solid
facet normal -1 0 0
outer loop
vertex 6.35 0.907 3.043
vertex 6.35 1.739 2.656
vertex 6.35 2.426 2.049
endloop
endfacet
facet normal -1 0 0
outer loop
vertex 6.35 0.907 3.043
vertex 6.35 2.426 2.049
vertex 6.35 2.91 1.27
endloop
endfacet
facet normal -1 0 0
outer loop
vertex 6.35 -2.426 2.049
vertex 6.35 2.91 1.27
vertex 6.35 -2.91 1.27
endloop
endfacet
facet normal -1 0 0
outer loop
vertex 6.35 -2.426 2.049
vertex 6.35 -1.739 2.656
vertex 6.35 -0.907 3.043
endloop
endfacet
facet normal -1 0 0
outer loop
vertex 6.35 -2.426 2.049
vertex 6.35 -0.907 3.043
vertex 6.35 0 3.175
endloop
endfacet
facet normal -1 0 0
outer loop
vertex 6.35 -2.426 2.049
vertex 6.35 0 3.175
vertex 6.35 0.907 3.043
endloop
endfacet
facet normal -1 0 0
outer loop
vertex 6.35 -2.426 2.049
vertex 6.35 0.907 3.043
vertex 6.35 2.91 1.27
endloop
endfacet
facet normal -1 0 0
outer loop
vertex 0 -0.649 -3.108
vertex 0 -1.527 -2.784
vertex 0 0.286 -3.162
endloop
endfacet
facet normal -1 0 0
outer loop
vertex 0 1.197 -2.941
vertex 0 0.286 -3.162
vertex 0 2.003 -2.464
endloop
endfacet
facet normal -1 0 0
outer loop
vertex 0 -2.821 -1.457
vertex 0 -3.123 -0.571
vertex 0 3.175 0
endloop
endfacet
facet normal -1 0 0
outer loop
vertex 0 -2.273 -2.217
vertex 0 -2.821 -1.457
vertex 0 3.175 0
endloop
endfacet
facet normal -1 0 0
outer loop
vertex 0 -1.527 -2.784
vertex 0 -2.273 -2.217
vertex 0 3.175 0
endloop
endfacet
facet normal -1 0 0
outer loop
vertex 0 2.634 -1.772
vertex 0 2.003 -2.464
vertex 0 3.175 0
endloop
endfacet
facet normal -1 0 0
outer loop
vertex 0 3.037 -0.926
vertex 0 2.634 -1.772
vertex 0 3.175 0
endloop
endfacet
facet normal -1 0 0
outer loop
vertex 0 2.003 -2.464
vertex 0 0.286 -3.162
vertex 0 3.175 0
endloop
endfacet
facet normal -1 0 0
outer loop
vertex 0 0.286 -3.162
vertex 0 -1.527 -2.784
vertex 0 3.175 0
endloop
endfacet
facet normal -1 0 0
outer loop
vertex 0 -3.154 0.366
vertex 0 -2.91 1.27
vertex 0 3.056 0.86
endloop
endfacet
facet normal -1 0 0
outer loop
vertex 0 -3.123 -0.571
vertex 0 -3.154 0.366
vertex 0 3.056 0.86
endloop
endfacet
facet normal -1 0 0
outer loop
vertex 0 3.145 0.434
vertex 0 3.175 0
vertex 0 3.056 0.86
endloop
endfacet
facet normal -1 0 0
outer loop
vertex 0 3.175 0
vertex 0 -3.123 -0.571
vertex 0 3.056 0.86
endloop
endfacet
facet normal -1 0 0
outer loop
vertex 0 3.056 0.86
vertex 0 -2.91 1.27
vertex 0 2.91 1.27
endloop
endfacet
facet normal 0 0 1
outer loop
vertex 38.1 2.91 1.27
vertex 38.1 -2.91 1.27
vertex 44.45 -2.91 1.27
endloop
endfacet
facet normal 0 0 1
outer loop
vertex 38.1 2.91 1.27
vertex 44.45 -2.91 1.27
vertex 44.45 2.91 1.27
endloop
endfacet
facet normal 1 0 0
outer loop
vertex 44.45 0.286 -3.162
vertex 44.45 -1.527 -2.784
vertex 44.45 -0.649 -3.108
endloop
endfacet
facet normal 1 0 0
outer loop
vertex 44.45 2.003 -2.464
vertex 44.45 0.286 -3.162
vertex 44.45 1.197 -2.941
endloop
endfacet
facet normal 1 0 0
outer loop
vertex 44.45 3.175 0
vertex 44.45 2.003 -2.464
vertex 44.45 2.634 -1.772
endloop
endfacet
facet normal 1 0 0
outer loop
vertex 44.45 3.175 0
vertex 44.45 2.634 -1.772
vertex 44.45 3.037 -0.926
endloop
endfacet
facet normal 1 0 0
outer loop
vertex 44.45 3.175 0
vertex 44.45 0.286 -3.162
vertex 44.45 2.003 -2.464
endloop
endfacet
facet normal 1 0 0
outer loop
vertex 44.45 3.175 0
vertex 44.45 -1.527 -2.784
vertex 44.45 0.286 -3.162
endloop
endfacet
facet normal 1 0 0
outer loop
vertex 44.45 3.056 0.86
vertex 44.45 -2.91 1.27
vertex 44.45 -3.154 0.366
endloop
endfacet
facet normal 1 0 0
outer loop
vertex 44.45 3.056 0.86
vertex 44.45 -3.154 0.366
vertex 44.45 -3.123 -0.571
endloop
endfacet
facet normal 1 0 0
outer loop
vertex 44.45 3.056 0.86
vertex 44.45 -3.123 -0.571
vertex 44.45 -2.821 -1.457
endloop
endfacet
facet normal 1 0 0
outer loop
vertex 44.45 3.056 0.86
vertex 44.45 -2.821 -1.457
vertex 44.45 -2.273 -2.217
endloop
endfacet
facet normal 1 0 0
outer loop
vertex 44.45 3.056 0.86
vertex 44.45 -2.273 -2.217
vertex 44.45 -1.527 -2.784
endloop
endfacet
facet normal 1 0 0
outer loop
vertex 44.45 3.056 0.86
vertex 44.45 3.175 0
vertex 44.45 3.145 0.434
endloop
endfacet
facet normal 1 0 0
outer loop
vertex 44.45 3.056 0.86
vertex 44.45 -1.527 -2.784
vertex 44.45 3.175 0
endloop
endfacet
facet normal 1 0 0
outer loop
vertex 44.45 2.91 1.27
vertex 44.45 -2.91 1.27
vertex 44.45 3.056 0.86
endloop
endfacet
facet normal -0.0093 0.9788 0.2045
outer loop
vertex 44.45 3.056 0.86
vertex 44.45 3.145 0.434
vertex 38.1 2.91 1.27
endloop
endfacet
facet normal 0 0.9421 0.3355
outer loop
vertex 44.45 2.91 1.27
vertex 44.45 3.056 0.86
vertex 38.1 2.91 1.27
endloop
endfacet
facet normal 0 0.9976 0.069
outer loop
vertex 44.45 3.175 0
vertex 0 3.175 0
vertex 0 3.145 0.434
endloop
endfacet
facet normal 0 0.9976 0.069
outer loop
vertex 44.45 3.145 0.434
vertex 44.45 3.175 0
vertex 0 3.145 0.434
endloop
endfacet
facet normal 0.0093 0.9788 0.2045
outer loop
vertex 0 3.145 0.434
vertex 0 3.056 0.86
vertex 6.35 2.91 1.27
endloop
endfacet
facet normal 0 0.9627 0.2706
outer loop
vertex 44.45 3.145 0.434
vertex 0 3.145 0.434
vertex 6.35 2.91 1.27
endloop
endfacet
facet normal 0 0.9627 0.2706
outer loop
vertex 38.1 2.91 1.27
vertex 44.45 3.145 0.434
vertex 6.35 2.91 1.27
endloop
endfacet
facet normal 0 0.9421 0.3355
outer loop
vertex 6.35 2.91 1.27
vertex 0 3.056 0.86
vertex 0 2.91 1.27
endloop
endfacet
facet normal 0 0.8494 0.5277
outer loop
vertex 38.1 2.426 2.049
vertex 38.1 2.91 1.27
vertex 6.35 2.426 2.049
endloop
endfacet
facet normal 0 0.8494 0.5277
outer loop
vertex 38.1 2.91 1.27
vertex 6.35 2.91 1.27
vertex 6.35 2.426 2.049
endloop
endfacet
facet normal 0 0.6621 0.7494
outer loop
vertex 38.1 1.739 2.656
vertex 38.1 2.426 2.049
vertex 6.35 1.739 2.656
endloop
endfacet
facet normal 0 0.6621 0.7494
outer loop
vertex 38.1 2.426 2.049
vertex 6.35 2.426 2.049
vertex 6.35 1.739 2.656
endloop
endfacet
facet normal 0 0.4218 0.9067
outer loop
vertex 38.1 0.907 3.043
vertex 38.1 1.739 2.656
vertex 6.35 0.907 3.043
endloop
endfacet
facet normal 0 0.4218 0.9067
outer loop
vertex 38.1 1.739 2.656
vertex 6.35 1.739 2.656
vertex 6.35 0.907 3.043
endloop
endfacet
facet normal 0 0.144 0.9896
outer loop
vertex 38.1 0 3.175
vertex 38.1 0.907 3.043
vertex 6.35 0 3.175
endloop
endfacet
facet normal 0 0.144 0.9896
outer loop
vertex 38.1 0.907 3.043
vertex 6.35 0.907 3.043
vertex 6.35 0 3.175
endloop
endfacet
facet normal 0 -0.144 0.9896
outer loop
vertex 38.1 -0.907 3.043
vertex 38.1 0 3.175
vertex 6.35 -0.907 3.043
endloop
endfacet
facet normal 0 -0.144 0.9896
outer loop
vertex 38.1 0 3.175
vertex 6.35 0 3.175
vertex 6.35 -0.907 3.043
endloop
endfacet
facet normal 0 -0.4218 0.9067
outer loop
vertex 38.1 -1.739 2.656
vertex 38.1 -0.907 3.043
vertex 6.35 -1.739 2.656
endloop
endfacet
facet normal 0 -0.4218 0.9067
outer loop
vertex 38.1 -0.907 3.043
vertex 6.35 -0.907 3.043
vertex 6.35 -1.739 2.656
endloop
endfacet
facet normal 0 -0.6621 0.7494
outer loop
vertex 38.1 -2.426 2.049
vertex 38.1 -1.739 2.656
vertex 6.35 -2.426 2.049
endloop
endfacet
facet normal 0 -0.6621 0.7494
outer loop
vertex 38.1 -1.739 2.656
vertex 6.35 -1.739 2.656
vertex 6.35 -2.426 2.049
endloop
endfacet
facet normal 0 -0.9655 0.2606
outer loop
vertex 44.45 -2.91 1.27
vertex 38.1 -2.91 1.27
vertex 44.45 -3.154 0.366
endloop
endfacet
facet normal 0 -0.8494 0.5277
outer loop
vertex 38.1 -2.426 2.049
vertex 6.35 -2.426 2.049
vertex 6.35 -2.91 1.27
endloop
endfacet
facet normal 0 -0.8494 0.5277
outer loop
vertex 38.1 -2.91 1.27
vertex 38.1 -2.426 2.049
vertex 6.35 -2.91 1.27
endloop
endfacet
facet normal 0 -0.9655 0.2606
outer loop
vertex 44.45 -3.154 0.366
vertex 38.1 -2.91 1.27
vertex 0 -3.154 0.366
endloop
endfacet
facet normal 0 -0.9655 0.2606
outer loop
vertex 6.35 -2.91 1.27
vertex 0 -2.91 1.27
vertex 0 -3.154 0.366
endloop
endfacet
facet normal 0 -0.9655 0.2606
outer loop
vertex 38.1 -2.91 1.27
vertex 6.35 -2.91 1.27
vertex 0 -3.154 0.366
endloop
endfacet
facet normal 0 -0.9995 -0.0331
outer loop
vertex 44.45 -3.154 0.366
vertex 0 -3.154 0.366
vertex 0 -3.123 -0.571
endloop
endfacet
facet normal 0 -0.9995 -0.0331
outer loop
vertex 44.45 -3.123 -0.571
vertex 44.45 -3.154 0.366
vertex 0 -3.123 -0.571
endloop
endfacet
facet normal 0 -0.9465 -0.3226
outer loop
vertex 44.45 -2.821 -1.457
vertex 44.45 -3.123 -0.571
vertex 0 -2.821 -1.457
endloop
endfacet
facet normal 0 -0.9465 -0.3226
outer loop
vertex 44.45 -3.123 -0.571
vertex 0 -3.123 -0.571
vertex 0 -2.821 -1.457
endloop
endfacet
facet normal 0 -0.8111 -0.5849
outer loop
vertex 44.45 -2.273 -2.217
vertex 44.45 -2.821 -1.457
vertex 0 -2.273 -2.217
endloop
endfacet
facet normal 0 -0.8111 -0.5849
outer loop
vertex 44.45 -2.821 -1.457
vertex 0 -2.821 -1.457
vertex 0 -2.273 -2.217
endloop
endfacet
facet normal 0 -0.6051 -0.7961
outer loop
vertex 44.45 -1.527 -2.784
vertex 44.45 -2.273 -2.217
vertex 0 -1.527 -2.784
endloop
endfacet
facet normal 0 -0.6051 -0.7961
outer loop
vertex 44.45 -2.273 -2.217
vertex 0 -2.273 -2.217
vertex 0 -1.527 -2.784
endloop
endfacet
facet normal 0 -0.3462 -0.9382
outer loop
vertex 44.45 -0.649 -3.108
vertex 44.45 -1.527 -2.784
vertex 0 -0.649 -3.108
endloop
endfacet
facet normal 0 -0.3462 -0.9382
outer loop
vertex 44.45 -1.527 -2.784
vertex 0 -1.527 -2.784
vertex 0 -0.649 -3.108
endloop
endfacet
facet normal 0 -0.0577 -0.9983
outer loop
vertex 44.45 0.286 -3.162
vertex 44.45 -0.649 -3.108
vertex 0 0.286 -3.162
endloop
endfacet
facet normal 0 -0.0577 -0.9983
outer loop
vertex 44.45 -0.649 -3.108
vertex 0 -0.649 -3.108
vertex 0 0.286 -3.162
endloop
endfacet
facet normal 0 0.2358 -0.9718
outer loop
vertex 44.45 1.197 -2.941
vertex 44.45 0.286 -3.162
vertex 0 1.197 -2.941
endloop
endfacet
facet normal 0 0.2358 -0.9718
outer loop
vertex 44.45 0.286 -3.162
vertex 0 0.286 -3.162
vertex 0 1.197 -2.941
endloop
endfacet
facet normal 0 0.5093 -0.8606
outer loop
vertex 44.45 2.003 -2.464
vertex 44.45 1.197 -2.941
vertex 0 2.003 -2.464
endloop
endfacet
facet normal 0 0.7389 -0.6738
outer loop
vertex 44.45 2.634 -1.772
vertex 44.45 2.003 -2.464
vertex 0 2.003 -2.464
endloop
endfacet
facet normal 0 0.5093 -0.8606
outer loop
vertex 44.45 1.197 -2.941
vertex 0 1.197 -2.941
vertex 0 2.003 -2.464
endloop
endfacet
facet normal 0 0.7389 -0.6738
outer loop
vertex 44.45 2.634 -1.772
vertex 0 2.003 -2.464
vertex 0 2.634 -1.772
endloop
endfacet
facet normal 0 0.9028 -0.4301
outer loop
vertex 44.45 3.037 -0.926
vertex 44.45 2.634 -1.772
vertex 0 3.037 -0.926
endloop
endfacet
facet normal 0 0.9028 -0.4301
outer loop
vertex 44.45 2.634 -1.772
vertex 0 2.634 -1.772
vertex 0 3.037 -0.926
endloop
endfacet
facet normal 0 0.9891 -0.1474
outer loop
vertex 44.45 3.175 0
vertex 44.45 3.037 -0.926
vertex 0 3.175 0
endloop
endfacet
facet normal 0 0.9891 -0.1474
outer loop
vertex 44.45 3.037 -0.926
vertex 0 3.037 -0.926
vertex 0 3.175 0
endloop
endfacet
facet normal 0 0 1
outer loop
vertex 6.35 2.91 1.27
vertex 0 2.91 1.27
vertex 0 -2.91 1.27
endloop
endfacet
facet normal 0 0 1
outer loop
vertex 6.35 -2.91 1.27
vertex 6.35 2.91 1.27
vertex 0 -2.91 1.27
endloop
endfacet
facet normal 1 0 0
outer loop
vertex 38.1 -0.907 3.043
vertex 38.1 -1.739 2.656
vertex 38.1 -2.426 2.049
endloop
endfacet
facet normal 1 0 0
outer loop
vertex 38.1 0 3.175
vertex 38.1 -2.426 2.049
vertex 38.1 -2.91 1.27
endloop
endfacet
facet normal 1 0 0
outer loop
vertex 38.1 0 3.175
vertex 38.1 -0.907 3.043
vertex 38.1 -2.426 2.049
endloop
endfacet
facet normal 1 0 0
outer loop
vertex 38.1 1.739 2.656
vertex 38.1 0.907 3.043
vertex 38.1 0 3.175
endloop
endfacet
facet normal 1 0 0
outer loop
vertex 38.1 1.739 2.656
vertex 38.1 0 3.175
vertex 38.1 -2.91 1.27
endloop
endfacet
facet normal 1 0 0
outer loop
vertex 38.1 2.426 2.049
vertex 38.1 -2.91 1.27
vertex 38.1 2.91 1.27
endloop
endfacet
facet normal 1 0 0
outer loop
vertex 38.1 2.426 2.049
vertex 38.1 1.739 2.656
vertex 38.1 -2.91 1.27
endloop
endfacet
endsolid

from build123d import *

# Parameters (mm, degrees)
F0_R     = 3.175
F1_DEPTH = 44.45
F3_DEPTH = 6.35
F5_DEPTH = 6.35


with BuildPart() as f1:
    # F0 (on Right) → F1 (new body)
    with BuildSketch(Plane.YZ):
        Circle(F0_R)
    extrude(amount=F1_DEPTH)

    # F2 (on face) → F3 (cut)
    with BuildSketch(Plane.YZ.offset(44.45)):
        with BuildLine():
            ThreePointArc((2.909936, 1.27), (0, 3.175), (-2.909936, 1.27))
            Line((-2.909936, 1.27), (2.909936, 1.27))
        make_face()
    extrude(amount=-F3_DEPTH, mode=Mode.SUBTRACT)

    # F4 (on face) → F5 (cut)
    with BuildSketch(Plane(origin=(0, 0, 0), x_dir=(0, -1, 0), z_dir=(-1, 0, 0))):
        with BuildLine():
            Line((-2.909936, 1.27), (2.909936, 1.27))
            ThreePointArc((2.909936, 1.27), (0, 3.175), (-2.909936, 1.27))
        make_face()
    extrude(amount=-F5_DEPTH, mode=Mode.SUBTRACT)


solid = f1.part
